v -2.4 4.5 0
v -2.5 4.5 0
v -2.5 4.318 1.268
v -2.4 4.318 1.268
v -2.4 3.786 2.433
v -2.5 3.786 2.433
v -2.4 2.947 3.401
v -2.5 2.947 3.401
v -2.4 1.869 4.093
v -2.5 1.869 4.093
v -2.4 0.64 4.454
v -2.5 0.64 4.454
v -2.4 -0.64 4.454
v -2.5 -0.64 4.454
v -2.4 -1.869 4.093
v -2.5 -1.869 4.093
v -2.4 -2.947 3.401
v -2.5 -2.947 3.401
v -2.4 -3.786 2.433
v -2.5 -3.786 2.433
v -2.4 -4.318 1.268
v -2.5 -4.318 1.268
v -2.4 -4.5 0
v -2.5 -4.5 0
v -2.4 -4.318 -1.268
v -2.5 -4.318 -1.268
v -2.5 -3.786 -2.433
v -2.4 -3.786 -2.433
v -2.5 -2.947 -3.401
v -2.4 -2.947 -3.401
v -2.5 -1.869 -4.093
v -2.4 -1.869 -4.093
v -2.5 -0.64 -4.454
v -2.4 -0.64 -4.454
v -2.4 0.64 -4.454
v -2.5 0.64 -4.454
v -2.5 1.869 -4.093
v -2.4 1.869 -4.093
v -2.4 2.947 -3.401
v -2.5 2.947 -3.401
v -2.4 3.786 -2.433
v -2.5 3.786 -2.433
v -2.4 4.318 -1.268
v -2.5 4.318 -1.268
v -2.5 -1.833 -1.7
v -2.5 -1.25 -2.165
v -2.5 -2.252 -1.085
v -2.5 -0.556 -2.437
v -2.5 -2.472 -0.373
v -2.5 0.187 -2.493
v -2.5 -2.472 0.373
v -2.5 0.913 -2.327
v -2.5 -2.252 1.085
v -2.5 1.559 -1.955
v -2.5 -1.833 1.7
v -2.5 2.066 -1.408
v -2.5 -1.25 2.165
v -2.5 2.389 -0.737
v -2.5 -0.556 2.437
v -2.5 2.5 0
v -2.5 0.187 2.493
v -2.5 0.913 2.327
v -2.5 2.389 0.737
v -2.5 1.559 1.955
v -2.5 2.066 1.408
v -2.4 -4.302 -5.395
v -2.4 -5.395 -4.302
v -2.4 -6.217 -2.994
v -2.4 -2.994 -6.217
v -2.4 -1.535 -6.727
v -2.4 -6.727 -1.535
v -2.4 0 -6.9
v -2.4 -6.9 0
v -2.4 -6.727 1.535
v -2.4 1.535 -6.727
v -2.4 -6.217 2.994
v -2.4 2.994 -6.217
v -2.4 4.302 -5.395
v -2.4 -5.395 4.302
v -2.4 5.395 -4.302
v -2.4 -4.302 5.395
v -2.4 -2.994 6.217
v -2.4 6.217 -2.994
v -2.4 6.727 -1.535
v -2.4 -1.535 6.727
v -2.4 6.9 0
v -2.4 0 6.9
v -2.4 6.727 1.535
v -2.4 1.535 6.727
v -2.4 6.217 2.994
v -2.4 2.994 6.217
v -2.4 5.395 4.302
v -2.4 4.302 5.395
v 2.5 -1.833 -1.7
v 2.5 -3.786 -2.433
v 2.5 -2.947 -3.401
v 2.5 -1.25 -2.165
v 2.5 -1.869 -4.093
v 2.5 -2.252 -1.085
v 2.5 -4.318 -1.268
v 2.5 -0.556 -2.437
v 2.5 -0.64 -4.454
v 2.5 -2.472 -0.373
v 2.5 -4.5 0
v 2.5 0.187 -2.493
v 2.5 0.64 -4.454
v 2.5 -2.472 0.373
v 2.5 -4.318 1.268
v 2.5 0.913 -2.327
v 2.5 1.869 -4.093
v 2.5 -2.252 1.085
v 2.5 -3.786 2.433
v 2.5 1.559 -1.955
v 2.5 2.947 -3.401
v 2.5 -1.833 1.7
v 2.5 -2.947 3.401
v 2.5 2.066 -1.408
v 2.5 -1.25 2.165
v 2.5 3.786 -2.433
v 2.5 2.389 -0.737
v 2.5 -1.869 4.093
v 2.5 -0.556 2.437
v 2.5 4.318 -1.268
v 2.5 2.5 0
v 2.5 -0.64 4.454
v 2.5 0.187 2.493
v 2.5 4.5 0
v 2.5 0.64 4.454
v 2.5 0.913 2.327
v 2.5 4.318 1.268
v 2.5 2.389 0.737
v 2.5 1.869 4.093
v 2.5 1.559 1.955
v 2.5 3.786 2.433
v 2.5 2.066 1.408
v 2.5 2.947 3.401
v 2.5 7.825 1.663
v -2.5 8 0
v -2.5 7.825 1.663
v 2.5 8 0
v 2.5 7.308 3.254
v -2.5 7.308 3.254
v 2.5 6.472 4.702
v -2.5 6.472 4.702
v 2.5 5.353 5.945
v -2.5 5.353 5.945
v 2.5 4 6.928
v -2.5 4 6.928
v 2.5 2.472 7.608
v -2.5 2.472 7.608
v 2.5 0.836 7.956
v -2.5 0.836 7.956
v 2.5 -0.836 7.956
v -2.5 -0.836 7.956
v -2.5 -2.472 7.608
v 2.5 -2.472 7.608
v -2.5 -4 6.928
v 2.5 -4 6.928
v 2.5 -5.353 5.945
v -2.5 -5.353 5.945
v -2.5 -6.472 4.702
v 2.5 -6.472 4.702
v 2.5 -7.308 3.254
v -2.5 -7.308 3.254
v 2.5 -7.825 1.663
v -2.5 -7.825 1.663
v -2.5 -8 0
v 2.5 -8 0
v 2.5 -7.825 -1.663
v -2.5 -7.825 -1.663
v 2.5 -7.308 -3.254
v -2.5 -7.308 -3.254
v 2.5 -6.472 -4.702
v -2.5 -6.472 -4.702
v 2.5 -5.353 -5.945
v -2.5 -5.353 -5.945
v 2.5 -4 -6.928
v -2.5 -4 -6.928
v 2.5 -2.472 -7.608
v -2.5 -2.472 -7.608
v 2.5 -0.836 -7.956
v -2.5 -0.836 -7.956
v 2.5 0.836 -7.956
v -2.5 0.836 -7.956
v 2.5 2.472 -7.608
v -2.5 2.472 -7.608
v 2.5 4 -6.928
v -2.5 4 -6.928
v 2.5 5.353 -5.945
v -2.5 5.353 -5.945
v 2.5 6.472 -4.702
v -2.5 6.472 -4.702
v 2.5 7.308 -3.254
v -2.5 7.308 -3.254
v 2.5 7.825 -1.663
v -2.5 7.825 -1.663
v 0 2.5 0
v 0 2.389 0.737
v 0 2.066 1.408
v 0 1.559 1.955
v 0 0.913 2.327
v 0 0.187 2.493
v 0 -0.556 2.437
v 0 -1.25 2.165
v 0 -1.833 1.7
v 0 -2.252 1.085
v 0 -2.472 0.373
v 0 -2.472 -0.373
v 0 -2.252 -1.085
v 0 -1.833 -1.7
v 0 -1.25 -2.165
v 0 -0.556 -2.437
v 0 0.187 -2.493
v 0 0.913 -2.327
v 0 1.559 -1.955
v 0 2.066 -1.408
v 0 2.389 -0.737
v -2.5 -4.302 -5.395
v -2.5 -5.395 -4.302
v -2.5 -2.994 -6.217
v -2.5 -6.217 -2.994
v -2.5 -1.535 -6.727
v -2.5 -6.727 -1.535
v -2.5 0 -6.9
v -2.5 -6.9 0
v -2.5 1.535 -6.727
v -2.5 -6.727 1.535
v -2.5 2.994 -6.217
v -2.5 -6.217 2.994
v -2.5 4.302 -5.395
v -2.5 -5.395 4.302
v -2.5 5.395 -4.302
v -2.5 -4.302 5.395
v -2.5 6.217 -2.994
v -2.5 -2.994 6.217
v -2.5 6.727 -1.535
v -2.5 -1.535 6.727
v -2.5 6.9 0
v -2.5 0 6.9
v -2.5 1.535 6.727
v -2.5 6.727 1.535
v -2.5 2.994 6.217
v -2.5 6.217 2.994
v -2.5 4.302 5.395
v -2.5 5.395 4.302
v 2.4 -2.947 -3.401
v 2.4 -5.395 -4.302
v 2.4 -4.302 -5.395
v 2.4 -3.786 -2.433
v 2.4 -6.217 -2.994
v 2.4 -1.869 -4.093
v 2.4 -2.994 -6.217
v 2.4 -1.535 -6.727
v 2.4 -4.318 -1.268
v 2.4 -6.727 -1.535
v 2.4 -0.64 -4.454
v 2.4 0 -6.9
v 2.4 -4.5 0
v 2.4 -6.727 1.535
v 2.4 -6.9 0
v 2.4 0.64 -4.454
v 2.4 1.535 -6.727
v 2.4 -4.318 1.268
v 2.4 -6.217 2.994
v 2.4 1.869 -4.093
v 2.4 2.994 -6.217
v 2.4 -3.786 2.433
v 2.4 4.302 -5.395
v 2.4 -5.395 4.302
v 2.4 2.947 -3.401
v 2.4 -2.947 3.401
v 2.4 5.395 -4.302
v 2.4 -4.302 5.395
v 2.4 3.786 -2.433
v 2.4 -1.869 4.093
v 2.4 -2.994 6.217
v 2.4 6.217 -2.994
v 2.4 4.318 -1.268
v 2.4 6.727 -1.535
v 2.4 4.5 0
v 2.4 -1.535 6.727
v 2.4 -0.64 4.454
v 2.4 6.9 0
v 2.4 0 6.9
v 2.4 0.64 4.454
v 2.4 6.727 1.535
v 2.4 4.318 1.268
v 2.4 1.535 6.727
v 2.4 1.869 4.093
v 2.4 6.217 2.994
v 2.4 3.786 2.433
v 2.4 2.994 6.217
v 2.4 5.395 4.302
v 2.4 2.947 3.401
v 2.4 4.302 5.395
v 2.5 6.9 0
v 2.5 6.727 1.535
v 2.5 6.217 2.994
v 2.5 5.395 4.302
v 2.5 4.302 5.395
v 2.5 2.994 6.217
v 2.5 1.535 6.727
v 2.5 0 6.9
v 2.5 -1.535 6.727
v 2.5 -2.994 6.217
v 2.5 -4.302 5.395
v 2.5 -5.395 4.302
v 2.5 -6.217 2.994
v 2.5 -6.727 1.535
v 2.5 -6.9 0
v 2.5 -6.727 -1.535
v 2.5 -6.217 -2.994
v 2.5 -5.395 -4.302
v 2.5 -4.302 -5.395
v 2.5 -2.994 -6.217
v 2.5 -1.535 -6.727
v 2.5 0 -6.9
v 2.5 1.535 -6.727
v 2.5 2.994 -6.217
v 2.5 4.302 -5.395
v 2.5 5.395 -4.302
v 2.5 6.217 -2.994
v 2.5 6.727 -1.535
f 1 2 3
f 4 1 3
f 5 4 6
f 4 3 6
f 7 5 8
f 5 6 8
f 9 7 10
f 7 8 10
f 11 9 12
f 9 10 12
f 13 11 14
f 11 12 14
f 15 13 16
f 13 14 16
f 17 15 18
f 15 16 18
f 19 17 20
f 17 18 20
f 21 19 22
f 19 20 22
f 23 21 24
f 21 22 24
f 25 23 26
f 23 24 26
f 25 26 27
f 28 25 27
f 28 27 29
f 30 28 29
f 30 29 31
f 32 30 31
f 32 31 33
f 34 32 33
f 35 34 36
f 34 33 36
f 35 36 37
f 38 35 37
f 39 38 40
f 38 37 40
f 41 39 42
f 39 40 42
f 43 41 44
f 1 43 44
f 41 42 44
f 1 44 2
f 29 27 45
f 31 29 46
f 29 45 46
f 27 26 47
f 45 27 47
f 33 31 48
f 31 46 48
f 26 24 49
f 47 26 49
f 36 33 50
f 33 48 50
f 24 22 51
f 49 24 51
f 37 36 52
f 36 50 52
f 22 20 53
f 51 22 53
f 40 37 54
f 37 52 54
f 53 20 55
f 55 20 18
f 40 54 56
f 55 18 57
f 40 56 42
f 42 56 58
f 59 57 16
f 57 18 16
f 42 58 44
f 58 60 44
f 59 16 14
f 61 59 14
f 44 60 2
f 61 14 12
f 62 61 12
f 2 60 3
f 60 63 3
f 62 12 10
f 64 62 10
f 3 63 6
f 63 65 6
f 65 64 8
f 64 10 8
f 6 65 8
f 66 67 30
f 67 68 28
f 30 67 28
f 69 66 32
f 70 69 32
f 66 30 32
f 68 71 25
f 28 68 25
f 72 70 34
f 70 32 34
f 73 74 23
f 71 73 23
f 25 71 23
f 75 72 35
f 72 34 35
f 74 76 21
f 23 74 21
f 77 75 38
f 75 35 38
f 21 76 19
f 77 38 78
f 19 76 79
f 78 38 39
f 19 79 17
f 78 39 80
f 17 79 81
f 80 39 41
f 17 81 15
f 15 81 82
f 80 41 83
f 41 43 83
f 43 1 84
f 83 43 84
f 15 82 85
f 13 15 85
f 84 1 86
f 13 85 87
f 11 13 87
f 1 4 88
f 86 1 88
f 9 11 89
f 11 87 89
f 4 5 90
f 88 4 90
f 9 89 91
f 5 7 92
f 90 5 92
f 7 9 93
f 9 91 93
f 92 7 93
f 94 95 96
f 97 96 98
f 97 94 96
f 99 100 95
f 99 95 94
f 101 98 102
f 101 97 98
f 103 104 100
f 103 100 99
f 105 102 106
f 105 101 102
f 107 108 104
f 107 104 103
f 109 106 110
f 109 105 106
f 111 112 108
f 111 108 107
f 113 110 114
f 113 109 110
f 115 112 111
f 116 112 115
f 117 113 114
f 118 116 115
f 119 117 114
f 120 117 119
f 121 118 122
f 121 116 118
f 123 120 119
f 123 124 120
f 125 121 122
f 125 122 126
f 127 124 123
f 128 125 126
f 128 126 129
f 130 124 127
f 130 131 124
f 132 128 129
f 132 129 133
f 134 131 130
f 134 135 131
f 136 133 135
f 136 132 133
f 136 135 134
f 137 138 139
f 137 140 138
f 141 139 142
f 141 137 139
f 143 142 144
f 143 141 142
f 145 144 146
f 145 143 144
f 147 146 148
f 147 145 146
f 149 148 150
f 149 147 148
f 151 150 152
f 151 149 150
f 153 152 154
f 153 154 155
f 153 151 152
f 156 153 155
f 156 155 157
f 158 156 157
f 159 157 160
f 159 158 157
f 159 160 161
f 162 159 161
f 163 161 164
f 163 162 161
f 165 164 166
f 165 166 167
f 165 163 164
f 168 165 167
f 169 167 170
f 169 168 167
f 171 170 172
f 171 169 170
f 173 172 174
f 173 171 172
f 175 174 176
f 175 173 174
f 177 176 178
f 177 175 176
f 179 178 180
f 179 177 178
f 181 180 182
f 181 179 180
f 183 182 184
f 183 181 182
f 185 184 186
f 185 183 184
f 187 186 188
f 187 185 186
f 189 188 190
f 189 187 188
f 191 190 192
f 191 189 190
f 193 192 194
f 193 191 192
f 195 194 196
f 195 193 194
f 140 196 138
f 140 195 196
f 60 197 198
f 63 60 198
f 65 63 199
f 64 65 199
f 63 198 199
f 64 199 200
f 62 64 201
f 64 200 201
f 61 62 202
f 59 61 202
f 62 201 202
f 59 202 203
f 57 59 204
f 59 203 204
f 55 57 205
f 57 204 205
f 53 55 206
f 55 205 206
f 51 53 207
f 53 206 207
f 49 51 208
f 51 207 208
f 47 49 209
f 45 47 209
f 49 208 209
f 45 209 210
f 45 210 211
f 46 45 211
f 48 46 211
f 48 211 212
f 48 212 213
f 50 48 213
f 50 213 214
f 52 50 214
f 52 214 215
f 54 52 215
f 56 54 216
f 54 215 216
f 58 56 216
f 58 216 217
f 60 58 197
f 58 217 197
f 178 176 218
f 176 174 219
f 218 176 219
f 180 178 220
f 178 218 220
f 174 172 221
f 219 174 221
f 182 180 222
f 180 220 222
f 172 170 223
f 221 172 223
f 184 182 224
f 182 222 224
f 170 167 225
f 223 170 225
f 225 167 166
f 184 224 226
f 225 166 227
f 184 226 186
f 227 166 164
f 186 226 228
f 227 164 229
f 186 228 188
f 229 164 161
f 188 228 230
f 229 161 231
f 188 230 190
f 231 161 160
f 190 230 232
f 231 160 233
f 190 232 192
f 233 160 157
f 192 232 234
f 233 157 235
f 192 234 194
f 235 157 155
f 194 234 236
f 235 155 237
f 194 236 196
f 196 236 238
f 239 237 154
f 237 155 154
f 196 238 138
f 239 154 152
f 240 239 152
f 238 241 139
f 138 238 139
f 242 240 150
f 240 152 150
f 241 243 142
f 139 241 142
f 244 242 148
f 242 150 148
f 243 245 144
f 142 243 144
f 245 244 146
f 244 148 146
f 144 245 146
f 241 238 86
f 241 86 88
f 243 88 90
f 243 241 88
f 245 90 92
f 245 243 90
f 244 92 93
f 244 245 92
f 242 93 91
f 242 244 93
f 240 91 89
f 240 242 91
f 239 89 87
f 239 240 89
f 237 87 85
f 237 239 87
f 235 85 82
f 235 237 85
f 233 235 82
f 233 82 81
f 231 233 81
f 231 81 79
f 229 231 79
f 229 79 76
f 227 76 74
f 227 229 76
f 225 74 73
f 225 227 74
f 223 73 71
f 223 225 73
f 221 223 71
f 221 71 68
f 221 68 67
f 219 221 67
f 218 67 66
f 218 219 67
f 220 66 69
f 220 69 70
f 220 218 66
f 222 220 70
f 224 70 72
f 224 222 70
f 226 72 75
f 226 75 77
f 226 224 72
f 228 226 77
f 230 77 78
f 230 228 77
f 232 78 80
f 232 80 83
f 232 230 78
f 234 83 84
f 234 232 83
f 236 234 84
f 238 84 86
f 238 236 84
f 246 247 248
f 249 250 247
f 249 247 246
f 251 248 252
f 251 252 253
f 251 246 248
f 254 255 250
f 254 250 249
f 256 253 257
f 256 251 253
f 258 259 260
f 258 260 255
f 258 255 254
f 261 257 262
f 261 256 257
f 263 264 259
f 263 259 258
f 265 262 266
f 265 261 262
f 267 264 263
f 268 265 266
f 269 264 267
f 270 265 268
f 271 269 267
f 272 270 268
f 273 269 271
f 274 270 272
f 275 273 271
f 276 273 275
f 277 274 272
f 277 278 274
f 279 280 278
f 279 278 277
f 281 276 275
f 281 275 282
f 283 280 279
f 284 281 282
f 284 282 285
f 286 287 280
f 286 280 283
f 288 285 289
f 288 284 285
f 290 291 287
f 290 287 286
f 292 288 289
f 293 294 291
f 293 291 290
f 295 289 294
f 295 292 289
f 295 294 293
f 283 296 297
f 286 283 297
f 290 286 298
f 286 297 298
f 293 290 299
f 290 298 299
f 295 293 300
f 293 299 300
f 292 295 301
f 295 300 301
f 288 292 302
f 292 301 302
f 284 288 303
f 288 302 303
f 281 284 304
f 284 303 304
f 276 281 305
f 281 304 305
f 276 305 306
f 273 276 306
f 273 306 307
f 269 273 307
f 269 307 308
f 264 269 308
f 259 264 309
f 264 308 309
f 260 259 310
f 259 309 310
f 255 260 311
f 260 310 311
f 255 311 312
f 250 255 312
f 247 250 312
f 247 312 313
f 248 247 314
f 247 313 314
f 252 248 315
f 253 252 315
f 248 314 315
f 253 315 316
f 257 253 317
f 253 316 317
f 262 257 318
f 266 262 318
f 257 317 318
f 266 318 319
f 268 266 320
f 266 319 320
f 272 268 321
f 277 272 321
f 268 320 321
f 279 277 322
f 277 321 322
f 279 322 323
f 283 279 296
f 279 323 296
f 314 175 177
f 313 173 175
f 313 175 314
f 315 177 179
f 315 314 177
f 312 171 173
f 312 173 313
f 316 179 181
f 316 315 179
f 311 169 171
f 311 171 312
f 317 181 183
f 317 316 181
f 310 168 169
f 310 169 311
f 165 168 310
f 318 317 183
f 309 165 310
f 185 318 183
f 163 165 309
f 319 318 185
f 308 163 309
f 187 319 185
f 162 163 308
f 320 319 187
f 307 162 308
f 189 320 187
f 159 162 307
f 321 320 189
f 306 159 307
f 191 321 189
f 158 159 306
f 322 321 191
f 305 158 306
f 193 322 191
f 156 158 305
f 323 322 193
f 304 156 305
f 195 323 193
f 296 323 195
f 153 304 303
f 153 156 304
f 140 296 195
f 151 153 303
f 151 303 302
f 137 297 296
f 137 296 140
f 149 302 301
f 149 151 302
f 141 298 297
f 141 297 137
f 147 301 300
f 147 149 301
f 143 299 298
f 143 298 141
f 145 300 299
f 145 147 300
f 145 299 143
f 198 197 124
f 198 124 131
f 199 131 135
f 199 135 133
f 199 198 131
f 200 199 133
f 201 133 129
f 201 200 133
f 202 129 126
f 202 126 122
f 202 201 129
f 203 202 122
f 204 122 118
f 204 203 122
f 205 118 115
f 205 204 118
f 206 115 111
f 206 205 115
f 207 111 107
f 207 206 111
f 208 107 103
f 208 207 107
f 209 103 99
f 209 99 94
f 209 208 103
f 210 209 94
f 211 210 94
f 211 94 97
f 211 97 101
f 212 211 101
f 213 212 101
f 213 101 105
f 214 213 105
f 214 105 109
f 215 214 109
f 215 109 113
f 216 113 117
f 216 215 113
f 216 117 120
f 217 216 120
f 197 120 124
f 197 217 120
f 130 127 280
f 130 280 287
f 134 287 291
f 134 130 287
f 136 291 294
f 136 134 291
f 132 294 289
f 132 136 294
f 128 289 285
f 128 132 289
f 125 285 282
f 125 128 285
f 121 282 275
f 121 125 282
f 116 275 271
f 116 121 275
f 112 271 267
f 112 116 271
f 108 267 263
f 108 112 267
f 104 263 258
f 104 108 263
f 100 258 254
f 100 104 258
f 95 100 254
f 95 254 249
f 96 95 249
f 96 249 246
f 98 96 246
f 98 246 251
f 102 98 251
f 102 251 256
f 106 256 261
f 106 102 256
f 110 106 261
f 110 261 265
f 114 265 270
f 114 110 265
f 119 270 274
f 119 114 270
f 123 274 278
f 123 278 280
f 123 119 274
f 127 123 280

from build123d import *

# Parameters (mm, degrees)
F0_R          = 8
F0_R_2        = 2.5
F1_DEPTH      = 2.5
F1_DEPTH_BACK = 2.5
F2_R          = 6.9
F2_R_2        = 4.5
F3_DEPTH      = 0.1


# Not quite as in the source:
# - a pattern or mirror of a feature is missing from the dataset's text; its kind, count and spacing are read off the source's solid


with BuildPart() as f1:
    # F0 (on Right) → F1 (new body, two sides)
    with BuildSketch(Plane.YZ) as f1_sk:
        Circle(F0_R)
        Circle(F0_R_2, mode=Mode.SUBTRACT)
    extrude(amount=F1_DEPTH)
    extrude(f1_sk.sketch, amount=-F1_DEPTH_BACK)

    # F2 (on face) → F3 (cut)
    with BuildSketch(Plane.YZ.offset(2.5)):
        Circle(F2_R)
        Circle(F2_R_2, mode=Mode.SUBTRACT)
    f3 = extrude(amount=-F3_DEPTH, mode=Mode.SUBTRACT)

    # F3_copies: F3 across plane
    add(f3.mirror(Plane(origin=(0, 0, 0), x_dir=(0, 0, -1), z_dir=(-1, 0, 0))), mode=Mode.SUBTRACT)


solid = f1.part
